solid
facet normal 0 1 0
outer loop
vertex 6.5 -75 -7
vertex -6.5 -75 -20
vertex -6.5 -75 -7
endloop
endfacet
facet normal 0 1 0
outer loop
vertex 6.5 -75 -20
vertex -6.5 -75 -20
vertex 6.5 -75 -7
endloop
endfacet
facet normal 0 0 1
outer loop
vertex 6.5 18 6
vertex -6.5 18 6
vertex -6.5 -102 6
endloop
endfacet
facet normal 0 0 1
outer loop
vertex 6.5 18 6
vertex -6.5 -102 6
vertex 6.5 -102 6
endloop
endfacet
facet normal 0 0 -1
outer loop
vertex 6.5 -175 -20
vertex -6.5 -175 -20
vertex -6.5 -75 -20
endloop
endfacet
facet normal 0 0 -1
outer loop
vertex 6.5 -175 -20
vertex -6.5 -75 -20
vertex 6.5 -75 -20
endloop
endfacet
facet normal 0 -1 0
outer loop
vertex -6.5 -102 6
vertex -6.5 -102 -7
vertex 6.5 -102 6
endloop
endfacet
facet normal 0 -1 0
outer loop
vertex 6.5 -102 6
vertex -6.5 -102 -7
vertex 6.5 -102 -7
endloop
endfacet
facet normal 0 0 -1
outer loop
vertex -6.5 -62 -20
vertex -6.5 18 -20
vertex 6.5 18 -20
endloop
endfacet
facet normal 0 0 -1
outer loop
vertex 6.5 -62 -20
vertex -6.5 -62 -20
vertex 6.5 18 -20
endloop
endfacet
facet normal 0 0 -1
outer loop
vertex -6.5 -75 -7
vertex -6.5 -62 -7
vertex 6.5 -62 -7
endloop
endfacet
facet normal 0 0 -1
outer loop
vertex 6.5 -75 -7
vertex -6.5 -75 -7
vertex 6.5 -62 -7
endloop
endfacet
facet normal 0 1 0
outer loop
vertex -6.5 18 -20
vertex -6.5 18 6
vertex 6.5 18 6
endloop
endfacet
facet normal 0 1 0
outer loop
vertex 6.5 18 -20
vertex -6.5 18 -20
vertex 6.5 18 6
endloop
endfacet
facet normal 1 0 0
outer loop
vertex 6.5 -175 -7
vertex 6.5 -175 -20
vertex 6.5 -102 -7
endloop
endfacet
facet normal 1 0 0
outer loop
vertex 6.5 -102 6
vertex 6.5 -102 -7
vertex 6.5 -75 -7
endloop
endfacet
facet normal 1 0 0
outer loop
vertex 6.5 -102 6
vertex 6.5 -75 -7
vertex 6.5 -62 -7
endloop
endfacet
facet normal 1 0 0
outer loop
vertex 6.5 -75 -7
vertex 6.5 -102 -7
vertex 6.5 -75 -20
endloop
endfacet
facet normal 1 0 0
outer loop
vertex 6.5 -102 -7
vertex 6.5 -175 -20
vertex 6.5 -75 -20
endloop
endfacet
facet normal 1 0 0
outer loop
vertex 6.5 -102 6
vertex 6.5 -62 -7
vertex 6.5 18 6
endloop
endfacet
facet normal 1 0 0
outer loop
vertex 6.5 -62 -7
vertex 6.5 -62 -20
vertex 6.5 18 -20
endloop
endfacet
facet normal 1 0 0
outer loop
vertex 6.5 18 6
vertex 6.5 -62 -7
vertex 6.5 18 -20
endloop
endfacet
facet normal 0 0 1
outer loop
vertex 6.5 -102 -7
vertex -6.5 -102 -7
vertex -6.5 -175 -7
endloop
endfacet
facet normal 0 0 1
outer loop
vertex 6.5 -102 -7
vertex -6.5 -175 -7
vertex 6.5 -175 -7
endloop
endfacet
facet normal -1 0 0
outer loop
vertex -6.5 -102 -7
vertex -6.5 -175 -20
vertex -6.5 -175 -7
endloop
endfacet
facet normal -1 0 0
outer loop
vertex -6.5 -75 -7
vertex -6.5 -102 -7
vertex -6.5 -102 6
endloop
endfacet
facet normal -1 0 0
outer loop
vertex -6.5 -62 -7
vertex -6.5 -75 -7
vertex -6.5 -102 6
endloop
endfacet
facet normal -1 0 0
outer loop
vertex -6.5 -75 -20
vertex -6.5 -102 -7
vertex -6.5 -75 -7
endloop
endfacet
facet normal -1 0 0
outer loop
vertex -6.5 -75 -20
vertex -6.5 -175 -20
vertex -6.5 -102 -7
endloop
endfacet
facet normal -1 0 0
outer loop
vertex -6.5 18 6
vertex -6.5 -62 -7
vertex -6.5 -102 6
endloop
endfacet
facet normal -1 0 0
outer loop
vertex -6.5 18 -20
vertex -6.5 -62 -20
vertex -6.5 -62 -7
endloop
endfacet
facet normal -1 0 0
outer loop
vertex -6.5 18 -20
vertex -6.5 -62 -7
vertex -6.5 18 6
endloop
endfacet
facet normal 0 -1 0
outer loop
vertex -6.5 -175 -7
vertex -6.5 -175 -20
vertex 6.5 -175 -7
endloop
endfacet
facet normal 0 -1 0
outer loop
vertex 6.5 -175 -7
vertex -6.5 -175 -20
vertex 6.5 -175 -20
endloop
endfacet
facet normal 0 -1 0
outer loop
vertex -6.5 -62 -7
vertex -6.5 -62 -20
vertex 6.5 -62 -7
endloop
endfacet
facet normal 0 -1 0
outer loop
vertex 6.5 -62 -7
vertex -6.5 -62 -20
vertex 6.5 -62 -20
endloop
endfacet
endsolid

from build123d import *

# Parameters (mm, degrees)
BOX039_W     = 13
BOX039_H     = 120
BOX039_DEPTH = 13
BOX038_W     = 13
BOX038_H     = 80
BOX038_DEPTH = 13
BOX040_W     = 13
BOX040_H     = 100
BOX040_DEPTH = 13


with BuildPart() as cube035:
    # Box039 → Box039 (new body)
    with BuildSketch(Plane(origin=(-6.5, -102, -7), x_dir=(1, 0, 0), z_dir=(0, 0, 1))):
        with Locations((6.5, 60)):
            Rectangle(BOX039_W, BOX039_H)
    extrude(amount=BOX039_DEPTH)


with BuildPart() as fusion020:
    # Box038 → Box038 (new body)
    with BuildSketch(Plane(origin=(-6.5, -62, -20), x_dir=(1, 0, 0), z_dir=(0, 0, 1))):
        with Locations((6.5, 40)):
            Rectangle(BOX038_W, BOX038_H)
    extrude(amount=BOX038_DEPTH)

    # Fusion020: union Cube035
    add(cube035.part)


with BuildPart() as fusion025:
    # Box040 → Box040 (new body)
    with BuildSketch(Plane(origin=(-6.5, -175, -20), x_dir=(1, 0, 0), z_dir=(0, 0, 1))):
        with Locations((6.5, 50)):
            Rectangle(BOX040_W, BOX040_H)
    extrude(amount=BOX040_DEPTH)

    # Fusion025: union Fusion020
    add(fusion020.part)


solid = fusion025.part
